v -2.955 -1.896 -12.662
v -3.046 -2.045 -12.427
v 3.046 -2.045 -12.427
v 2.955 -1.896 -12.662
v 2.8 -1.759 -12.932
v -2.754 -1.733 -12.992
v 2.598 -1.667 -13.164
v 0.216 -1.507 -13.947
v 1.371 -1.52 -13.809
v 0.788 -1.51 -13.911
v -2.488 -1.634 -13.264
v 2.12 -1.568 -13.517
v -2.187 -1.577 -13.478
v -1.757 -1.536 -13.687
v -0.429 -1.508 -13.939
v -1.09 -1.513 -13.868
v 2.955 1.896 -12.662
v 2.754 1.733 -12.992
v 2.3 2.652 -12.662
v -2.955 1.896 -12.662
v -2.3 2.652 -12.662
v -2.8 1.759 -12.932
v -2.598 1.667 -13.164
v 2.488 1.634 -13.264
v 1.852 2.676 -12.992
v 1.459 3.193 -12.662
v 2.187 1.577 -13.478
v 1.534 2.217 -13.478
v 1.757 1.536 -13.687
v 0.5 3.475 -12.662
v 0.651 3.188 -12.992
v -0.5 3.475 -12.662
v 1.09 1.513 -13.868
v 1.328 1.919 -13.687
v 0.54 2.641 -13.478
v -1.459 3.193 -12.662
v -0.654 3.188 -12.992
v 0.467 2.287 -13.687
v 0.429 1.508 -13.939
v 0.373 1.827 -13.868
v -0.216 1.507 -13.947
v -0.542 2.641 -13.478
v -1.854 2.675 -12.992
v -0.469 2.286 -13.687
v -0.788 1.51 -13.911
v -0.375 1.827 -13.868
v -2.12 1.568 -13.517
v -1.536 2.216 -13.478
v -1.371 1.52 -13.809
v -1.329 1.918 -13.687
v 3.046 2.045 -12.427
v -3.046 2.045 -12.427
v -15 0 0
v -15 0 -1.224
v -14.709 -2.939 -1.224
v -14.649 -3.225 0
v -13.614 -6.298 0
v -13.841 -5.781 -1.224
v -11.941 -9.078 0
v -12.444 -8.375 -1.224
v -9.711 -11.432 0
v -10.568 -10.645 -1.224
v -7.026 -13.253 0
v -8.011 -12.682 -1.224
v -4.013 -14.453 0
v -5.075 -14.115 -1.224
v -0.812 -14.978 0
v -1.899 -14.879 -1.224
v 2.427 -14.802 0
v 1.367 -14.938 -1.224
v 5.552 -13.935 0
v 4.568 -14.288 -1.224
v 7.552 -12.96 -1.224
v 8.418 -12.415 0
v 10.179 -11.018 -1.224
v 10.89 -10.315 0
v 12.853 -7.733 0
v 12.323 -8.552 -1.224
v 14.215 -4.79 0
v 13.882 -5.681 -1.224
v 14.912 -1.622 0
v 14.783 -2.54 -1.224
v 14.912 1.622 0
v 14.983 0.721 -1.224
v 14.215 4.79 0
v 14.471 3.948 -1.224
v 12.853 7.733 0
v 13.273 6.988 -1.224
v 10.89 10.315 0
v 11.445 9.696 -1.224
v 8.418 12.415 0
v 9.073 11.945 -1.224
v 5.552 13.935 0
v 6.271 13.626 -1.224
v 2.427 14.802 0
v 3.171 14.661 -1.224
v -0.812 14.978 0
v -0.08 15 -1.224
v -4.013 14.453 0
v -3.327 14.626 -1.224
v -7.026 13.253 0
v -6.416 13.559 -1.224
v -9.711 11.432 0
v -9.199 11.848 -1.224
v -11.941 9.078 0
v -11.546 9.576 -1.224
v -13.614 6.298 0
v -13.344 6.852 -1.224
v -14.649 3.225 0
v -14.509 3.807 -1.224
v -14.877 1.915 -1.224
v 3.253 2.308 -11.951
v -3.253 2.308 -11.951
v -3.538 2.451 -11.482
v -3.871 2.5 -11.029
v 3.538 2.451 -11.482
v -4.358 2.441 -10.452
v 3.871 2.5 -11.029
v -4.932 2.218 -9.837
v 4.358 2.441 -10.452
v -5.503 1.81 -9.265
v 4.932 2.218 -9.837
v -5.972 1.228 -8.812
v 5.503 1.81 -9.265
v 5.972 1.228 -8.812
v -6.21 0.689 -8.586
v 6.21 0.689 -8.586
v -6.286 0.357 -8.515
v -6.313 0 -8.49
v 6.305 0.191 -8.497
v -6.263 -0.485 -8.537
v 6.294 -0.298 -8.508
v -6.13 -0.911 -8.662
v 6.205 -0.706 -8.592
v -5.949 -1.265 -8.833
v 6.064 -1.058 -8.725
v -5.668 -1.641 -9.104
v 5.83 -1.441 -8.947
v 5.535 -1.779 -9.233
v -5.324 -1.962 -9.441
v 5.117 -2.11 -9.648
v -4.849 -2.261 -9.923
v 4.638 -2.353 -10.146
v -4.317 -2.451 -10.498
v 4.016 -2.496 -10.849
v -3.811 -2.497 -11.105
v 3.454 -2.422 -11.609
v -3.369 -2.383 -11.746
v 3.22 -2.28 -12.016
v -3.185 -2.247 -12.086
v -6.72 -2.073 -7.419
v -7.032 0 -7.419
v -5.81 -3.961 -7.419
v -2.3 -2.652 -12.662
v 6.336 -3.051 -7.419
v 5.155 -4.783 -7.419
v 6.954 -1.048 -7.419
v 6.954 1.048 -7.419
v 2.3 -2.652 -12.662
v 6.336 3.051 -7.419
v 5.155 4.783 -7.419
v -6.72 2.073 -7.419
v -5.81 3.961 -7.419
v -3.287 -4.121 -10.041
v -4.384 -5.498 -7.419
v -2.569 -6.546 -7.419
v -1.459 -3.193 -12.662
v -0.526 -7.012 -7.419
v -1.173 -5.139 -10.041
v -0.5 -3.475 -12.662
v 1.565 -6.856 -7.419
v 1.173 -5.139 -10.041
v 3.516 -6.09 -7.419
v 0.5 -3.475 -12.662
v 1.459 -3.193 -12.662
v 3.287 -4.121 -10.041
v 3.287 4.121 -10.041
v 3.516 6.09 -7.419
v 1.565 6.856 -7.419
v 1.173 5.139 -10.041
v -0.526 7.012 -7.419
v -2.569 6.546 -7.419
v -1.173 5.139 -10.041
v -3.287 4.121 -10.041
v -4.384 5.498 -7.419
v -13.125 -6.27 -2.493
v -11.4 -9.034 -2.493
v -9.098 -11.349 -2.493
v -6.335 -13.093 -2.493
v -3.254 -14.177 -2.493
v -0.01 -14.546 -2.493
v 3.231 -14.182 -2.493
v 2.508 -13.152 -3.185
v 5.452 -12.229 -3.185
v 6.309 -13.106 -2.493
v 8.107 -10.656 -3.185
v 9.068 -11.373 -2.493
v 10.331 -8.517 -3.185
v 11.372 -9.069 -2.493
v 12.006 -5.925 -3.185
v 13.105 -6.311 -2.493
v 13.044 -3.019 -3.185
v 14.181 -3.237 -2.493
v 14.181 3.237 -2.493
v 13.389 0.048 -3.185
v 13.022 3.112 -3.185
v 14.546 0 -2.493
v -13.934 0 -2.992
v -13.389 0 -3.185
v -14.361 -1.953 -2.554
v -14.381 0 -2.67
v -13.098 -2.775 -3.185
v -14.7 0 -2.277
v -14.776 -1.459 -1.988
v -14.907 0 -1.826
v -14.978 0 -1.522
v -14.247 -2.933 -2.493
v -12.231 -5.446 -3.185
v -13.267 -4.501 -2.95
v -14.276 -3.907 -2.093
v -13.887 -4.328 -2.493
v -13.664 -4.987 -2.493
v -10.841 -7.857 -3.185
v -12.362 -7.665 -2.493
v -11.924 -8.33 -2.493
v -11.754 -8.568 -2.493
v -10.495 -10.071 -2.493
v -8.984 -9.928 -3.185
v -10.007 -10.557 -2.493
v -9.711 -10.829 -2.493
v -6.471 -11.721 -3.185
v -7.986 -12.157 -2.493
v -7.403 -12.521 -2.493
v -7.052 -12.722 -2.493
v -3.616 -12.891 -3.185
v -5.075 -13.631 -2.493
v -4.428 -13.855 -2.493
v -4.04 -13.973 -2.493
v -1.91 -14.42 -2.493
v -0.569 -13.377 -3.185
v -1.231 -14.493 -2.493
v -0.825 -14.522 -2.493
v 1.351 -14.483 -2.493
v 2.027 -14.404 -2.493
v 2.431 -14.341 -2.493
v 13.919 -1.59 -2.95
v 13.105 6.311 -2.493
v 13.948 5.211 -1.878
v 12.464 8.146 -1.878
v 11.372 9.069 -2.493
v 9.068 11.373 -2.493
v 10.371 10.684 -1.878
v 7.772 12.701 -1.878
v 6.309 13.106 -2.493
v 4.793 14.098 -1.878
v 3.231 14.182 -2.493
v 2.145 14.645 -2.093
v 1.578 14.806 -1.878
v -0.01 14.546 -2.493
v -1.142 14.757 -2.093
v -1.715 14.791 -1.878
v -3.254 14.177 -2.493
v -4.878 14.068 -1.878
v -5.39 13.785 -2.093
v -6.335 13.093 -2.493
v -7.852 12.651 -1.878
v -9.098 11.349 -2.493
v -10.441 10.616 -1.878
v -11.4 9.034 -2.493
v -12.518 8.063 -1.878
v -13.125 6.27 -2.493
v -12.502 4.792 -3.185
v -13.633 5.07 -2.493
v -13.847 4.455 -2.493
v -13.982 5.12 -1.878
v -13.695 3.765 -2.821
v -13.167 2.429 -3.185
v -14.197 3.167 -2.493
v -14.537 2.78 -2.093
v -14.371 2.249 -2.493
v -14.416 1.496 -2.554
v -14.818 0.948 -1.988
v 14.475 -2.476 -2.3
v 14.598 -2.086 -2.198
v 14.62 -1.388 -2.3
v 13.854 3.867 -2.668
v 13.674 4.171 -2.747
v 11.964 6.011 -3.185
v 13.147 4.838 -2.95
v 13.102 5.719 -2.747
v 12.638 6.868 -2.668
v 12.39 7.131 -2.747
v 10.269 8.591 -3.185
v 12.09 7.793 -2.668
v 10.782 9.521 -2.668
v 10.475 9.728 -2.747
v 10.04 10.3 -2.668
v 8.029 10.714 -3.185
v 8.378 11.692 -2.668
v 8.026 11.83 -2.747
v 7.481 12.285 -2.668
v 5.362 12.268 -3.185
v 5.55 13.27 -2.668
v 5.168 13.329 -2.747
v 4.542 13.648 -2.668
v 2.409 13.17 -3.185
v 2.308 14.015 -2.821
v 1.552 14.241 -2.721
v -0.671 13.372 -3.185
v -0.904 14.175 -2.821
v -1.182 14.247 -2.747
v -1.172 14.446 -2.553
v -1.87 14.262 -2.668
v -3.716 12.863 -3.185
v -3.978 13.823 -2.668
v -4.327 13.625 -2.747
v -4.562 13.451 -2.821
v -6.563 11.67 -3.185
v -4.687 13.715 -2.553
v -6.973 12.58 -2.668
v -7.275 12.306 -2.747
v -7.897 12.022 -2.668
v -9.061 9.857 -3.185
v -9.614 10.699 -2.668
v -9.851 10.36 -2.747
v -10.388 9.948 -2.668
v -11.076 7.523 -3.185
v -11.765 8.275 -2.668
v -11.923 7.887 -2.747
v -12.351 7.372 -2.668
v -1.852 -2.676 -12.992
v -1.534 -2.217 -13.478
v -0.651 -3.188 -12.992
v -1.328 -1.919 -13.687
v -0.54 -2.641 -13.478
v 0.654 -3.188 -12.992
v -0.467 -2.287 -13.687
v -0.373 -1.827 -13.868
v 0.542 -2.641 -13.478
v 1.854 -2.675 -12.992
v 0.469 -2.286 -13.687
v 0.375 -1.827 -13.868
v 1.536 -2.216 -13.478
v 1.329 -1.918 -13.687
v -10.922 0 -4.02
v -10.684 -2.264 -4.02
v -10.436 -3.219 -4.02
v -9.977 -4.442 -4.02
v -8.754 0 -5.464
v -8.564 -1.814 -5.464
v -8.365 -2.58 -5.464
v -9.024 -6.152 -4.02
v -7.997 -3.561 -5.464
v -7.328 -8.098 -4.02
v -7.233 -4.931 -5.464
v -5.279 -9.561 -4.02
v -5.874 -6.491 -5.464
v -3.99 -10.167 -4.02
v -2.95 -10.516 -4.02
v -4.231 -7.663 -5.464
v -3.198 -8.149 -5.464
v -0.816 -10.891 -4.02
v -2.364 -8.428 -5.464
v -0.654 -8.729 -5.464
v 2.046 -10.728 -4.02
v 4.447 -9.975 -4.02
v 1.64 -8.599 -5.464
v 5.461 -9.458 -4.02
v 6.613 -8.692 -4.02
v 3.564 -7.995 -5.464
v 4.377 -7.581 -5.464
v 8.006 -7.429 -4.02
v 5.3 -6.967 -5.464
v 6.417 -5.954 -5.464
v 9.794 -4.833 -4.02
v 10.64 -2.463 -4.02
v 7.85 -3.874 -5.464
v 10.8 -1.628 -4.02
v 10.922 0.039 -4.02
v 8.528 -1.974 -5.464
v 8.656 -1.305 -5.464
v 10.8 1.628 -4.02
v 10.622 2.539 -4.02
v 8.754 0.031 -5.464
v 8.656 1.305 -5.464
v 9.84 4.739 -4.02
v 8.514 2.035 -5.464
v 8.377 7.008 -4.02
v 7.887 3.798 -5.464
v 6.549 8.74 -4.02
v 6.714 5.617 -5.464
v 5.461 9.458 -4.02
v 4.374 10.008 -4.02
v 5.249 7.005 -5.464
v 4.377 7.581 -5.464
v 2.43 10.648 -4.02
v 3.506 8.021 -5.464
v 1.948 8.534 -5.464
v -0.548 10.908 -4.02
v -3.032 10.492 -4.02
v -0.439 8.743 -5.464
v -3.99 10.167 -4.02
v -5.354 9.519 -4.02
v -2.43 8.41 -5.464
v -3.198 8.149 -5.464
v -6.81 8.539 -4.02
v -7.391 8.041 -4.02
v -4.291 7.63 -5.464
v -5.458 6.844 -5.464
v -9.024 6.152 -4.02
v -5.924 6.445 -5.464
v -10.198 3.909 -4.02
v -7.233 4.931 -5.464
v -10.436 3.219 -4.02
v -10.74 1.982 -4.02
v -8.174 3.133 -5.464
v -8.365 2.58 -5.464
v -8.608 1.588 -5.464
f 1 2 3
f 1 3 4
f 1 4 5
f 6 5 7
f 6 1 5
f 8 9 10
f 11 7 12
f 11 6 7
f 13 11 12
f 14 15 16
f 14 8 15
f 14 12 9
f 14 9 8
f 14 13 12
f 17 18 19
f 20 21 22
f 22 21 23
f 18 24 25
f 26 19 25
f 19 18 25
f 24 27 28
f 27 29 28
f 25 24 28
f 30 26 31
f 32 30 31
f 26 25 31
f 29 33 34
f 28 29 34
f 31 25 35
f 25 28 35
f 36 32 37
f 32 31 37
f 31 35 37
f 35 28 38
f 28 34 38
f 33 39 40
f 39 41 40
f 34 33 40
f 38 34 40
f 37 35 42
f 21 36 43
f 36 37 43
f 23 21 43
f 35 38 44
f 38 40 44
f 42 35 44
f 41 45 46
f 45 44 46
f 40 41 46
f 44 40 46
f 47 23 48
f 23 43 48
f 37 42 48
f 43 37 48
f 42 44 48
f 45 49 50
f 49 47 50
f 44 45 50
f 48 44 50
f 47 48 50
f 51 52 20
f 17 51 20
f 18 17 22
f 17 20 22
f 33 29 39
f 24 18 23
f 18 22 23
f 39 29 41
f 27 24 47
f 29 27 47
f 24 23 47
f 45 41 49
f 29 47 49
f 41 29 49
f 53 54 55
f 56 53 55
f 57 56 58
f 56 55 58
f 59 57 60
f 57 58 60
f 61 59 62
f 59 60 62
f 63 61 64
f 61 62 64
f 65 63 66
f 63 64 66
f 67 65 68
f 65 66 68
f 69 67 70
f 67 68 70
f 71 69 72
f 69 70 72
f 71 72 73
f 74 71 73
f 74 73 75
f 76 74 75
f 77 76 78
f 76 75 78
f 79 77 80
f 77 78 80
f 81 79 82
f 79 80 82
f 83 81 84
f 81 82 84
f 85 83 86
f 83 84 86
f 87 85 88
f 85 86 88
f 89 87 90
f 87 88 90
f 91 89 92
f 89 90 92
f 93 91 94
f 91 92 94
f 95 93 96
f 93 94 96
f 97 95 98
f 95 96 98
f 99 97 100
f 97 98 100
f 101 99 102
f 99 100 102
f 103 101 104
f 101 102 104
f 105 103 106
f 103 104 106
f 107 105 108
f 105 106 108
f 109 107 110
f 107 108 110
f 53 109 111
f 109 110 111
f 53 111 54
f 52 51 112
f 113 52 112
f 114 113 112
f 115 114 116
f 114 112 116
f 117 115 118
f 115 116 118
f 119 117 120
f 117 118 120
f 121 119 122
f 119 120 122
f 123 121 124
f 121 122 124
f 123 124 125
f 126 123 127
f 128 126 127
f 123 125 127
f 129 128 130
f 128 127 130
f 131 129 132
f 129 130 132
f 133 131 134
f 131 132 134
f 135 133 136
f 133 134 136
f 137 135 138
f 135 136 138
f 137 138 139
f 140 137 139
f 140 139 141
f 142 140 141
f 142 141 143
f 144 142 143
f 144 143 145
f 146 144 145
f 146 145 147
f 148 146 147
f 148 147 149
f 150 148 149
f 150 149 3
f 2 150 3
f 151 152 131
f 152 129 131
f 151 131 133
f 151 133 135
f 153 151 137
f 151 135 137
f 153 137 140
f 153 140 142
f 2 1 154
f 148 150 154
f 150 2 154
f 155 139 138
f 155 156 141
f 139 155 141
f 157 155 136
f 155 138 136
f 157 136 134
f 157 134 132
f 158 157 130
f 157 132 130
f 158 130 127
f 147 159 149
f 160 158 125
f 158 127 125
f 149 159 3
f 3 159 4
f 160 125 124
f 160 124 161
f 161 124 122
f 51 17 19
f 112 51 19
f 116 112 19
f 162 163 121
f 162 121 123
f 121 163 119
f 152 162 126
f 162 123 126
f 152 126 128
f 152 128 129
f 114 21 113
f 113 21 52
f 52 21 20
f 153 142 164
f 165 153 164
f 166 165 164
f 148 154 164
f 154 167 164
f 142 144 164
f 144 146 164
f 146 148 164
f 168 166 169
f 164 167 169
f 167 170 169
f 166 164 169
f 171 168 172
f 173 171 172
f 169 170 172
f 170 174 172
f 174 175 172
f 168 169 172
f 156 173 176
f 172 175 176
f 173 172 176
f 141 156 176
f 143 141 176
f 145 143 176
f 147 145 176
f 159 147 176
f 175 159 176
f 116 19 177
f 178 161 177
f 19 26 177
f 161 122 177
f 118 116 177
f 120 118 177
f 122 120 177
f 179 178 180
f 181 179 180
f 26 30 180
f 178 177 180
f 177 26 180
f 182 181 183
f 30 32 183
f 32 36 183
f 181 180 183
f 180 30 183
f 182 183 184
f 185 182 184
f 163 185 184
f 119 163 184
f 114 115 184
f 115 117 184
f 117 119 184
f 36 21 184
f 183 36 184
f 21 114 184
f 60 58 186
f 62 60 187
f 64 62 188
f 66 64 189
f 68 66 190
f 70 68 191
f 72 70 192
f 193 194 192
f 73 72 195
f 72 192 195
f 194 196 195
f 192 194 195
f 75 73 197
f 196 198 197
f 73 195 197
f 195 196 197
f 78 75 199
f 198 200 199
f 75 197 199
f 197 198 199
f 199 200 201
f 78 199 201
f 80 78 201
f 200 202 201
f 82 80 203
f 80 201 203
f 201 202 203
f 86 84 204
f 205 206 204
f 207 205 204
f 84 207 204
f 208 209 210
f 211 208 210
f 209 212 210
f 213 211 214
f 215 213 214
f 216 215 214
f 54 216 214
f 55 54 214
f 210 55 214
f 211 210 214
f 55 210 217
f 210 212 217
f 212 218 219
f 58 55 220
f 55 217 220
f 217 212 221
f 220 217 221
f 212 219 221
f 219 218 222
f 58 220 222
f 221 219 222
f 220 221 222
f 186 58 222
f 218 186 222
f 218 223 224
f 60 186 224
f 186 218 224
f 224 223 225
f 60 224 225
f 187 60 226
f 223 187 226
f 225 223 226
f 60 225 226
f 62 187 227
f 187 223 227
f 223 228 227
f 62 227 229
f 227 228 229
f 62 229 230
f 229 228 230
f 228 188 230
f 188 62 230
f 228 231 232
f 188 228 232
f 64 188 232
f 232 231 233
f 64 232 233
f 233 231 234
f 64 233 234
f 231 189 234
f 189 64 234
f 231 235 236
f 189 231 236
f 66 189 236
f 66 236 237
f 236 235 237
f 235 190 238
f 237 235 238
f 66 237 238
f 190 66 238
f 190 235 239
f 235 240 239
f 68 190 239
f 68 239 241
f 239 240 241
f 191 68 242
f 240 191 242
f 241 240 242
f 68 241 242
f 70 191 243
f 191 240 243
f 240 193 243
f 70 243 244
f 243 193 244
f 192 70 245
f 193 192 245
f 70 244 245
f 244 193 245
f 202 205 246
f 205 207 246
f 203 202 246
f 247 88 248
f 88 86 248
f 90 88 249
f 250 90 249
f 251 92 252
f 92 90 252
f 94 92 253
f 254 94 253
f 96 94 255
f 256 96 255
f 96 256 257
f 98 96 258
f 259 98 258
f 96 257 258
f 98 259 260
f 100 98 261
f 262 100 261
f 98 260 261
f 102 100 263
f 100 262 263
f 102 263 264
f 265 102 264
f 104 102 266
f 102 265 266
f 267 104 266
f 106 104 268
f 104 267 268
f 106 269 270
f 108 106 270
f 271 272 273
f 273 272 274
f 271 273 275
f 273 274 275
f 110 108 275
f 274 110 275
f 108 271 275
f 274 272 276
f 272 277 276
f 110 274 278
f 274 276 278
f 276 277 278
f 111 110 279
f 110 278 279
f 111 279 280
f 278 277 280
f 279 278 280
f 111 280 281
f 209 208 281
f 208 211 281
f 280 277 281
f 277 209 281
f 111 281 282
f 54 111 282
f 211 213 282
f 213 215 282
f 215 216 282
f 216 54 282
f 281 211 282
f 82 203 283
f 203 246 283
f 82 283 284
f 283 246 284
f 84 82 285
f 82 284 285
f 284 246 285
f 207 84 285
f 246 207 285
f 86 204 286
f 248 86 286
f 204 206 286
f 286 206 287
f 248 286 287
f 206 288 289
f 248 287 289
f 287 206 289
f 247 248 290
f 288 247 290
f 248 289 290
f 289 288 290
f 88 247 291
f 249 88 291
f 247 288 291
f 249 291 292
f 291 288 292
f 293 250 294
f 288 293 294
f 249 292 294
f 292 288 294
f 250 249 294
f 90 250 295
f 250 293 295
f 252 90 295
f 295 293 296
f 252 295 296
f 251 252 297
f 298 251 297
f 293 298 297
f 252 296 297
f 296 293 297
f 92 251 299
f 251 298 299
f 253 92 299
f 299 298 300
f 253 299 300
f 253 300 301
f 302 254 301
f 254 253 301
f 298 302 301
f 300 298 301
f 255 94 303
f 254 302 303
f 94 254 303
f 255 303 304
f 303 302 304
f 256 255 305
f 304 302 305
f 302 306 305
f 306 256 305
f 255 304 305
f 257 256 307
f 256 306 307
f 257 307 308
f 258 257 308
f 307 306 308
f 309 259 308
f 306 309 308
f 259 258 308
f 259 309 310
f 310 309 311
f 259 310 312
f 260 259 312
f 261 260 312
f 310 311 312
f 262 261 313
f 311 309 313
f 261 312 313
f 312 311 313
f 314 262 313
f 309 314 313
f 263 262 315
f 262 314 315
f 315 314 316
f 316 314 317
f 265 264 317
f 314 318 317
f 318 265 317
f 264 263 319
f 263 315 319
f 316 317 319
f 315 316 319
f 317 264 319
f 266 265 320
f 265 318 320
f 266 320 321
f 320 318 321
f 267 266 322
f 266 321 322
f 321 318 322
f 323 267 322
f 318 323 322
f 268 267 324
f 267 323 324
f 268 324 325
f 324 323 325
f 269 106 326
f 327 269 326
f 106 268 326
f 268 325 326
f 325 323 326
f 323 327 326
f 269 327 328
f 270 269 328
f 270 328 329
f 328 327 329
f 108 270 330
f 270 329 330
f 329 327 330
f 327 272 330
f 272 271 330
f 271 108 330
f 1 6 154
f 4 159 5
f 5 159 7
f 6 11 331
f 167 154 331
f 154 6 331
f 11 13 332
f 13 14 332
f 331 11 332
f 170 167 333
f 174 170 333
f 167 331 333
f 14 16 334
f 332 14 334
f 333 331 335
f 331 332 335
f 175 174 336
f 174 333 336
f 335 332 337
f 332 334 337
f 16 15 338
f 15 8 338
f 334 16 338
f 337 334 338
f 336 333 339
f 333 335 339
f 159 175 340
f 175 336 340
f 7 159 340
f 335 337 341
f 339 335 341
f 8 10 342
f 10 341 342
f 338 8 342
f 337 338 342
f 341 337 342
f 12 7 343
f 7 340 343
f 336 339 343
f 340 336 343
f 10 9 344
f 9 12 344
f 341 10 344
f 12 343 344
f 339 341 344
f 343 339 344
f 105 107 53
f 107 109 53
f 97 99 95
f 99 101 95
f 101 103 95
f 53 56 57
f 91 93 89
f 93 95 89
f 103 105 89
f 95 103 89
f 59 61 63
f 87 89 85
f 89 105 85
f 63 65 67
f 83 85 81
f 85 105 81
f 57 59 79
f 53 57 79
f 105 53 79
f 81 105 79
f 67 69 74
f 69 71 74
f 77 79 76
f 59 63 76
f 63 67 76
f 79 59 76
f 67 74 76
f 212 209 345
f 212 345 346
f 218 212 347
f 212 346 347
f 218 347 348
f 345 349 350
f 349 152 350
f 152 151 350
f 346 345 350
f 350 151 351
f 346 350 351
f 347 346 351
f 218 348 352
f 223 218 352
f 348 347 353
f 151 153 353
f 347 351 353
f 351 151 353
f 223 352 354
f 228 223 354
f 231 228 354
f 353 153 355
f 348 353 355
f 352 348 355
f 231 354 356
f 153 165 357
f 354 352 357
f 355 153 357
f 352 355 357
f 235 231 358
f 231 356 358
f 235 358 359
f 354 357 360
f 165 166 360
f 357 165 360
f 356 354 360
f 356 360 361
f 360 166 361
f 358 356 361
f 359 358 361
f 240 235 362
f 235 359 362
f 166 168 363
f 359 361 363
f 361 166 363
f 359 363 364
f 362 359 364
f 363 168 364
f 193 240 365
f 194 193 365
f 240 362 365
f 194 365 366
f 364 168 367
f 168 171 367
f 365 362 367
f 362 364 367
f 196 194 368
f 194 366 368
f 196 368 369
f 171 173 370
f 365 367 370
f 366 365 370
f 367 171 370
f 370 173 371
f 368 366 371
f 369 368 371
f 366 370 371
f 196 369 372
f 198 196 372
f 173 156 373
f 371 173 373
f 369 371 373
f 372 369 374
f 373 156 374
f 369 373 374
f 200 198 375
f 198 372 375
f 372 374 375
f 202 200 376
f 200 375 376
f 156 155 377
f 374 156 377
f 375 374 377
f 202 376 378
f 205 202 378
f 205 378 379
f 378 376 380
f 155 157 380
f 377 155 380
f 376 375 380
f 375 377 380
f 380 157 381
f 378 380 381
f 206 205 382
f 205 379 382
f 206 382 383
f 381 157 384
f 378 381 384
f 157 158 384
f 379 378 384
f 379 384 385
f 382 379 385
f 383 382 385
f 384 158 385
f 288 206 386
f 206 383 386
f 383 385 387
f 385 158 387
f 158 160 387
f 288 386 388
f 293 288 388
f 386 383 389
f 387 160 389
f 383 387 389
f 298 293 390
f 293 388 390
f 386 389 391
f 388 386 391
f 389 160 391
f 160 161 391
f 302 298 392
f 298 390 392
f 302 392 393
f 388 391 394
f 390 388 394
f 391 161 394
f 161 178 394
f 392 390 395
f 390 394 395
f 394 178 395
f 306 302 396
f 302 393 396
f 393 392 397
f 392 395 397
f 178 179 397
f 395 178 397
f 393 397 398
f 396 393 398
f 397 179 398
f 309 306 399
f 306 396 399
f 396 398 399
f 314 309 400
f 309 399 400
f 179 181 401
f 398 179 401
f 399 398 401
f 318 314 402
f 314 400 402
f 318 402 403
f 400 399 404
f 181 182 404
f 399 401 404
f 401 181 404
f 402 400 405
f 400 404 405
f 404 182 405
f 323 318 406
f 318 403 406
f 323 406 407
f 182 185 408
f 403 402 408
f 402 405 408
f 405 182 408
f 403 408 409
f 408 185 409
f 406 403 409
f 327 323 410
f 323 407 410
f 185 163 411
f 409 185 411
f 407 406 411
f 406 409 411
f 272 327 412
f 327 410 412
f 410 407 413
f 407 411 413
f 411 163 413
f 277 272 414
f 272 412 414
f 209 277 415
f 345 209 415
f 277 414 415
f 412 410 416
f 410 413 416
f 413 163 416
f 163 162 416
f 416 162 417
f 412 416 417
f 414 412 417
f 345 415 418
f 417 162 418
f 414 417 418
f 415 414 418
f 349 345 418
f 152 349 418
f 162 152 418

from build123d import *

# Parameters (mm, degrees)
F3_R          = 2
F4_R          = 3
F6_DEPTH      = 15.0010001
F6_DEPTH_BACK = 15.0010001
F7_T1_DEPTH   = 11.5921148274


# Not quite as in the source:
# - a fillet or chamfer that OpenCascade refuses, or shapes differently, is made with other operations: its cross-section is extruded or revolved along the edge and cut away or added
# - a feature of the source that left no trace in its solid (it failed there, or was rolled back) is left out


with BuildPart() as f1:
    # F0 (on Front) → F1 (revolve)
    with BuildSketch(Plane.XZ):
        Polygon((0, -13.9897428453), (0, 0), (-15, 0), (-15, -3), (-10, -3), (-2.61932757, -13.9897428453), align=None)
    revolve(axis=Axis((0, 0, -6.9948714226), (0, 0, 1)))

    # F2: fillet of radius 10 on 1 edges, made by hand

    # F2_s1 → F2_t2 (revolve)
    with BuildSketch(Plane.XZ):
        with BuildLine():
            ThreePointArc((-15, -3), (-10.4835294041, -4.2493813133), (-7.0321290602, -7.4191283024))
            Line((-7.0321290602, -7.4191283024), (-10, -3))
            Line((-10, -3), (-15, -3))
        make_face()
    revolve(axis=Axis((0, 0, -3), (0, 0, 1)))

    # F3
    f3_edges = [f1.edges().sort_by_distance(p)[0] for p in [
        (15, 0, -3),
    ]]
    fillet(f3_edges, radius=F3_R)

    # F4
    f4_edges = [f1.edges().sort_by_distance(p)[0] for p in [
        (2.619328, 0, -13.989743),
    ]]
    fillet(f4_edges, radius=F4_R)

    # F5 (on Right) → F6 (cut, two sides)
    with BuildSketch(Plane.YZ) as f6_sk:
        with BuildLine():
            Line((1.5, -14.6206104997), (1.5, -12.9897428453))
            ThreePointArc((1.5, -12.9897428453), (0, -8.4897428453), (-1.5, -12.9897428453))
            Line((-1.5, -12.9897428453), (-1.5, -14.6206104997))
            Line((-1.5, -14.6206104997), (1.5, -14.6206104997))
        make_face()
    extrude(amount=-F6_DEPTH, mode=Mode.SUBTRACT)
    extrude(f6_sk.sketch, amount=F6_DEPTH_BACK, mode=Mode.SUBTRACT)

    # F7: fillet of radius 3 on 2 edges, made by hand

    # F7_s2 → F7_t1 (cut)
    with BuildSketch(Plane.YZ.offset(-5.7960574137)):
        with BuildLine():
            ThreePointArc((-2.0454545455, -12.4271417817), (-1.6396122323, -13.2474864717), (-1.5, -14.1520205055))
            Line((-1.5, -14.1520205055), (-1.5, -12.9897428453))
            ThreePointArc((-1.5, -12.9897428453), (-1.7949072323, -12.7299462895), (-2.0454545455, -12.4271417817))
        make_face()
        with BuildLine():
            ThreePointArc((2.0454545455, -12.4271417817), (1.6396122323, -13.2474864717), (1.5, -14.1520205055))
            Line((1.5, -14.1520205055), (1.5, -12.9897428453))
            ThreePointArc((1.5, -12.9897428453), (1.7949072323, -12.7299462895), (2.0454545455, -12.4271417817))
        make_face()
    extrude(amount=F7_T1_DEPTH, mode=Mode.SUBTRACT)


solid = f1.part
